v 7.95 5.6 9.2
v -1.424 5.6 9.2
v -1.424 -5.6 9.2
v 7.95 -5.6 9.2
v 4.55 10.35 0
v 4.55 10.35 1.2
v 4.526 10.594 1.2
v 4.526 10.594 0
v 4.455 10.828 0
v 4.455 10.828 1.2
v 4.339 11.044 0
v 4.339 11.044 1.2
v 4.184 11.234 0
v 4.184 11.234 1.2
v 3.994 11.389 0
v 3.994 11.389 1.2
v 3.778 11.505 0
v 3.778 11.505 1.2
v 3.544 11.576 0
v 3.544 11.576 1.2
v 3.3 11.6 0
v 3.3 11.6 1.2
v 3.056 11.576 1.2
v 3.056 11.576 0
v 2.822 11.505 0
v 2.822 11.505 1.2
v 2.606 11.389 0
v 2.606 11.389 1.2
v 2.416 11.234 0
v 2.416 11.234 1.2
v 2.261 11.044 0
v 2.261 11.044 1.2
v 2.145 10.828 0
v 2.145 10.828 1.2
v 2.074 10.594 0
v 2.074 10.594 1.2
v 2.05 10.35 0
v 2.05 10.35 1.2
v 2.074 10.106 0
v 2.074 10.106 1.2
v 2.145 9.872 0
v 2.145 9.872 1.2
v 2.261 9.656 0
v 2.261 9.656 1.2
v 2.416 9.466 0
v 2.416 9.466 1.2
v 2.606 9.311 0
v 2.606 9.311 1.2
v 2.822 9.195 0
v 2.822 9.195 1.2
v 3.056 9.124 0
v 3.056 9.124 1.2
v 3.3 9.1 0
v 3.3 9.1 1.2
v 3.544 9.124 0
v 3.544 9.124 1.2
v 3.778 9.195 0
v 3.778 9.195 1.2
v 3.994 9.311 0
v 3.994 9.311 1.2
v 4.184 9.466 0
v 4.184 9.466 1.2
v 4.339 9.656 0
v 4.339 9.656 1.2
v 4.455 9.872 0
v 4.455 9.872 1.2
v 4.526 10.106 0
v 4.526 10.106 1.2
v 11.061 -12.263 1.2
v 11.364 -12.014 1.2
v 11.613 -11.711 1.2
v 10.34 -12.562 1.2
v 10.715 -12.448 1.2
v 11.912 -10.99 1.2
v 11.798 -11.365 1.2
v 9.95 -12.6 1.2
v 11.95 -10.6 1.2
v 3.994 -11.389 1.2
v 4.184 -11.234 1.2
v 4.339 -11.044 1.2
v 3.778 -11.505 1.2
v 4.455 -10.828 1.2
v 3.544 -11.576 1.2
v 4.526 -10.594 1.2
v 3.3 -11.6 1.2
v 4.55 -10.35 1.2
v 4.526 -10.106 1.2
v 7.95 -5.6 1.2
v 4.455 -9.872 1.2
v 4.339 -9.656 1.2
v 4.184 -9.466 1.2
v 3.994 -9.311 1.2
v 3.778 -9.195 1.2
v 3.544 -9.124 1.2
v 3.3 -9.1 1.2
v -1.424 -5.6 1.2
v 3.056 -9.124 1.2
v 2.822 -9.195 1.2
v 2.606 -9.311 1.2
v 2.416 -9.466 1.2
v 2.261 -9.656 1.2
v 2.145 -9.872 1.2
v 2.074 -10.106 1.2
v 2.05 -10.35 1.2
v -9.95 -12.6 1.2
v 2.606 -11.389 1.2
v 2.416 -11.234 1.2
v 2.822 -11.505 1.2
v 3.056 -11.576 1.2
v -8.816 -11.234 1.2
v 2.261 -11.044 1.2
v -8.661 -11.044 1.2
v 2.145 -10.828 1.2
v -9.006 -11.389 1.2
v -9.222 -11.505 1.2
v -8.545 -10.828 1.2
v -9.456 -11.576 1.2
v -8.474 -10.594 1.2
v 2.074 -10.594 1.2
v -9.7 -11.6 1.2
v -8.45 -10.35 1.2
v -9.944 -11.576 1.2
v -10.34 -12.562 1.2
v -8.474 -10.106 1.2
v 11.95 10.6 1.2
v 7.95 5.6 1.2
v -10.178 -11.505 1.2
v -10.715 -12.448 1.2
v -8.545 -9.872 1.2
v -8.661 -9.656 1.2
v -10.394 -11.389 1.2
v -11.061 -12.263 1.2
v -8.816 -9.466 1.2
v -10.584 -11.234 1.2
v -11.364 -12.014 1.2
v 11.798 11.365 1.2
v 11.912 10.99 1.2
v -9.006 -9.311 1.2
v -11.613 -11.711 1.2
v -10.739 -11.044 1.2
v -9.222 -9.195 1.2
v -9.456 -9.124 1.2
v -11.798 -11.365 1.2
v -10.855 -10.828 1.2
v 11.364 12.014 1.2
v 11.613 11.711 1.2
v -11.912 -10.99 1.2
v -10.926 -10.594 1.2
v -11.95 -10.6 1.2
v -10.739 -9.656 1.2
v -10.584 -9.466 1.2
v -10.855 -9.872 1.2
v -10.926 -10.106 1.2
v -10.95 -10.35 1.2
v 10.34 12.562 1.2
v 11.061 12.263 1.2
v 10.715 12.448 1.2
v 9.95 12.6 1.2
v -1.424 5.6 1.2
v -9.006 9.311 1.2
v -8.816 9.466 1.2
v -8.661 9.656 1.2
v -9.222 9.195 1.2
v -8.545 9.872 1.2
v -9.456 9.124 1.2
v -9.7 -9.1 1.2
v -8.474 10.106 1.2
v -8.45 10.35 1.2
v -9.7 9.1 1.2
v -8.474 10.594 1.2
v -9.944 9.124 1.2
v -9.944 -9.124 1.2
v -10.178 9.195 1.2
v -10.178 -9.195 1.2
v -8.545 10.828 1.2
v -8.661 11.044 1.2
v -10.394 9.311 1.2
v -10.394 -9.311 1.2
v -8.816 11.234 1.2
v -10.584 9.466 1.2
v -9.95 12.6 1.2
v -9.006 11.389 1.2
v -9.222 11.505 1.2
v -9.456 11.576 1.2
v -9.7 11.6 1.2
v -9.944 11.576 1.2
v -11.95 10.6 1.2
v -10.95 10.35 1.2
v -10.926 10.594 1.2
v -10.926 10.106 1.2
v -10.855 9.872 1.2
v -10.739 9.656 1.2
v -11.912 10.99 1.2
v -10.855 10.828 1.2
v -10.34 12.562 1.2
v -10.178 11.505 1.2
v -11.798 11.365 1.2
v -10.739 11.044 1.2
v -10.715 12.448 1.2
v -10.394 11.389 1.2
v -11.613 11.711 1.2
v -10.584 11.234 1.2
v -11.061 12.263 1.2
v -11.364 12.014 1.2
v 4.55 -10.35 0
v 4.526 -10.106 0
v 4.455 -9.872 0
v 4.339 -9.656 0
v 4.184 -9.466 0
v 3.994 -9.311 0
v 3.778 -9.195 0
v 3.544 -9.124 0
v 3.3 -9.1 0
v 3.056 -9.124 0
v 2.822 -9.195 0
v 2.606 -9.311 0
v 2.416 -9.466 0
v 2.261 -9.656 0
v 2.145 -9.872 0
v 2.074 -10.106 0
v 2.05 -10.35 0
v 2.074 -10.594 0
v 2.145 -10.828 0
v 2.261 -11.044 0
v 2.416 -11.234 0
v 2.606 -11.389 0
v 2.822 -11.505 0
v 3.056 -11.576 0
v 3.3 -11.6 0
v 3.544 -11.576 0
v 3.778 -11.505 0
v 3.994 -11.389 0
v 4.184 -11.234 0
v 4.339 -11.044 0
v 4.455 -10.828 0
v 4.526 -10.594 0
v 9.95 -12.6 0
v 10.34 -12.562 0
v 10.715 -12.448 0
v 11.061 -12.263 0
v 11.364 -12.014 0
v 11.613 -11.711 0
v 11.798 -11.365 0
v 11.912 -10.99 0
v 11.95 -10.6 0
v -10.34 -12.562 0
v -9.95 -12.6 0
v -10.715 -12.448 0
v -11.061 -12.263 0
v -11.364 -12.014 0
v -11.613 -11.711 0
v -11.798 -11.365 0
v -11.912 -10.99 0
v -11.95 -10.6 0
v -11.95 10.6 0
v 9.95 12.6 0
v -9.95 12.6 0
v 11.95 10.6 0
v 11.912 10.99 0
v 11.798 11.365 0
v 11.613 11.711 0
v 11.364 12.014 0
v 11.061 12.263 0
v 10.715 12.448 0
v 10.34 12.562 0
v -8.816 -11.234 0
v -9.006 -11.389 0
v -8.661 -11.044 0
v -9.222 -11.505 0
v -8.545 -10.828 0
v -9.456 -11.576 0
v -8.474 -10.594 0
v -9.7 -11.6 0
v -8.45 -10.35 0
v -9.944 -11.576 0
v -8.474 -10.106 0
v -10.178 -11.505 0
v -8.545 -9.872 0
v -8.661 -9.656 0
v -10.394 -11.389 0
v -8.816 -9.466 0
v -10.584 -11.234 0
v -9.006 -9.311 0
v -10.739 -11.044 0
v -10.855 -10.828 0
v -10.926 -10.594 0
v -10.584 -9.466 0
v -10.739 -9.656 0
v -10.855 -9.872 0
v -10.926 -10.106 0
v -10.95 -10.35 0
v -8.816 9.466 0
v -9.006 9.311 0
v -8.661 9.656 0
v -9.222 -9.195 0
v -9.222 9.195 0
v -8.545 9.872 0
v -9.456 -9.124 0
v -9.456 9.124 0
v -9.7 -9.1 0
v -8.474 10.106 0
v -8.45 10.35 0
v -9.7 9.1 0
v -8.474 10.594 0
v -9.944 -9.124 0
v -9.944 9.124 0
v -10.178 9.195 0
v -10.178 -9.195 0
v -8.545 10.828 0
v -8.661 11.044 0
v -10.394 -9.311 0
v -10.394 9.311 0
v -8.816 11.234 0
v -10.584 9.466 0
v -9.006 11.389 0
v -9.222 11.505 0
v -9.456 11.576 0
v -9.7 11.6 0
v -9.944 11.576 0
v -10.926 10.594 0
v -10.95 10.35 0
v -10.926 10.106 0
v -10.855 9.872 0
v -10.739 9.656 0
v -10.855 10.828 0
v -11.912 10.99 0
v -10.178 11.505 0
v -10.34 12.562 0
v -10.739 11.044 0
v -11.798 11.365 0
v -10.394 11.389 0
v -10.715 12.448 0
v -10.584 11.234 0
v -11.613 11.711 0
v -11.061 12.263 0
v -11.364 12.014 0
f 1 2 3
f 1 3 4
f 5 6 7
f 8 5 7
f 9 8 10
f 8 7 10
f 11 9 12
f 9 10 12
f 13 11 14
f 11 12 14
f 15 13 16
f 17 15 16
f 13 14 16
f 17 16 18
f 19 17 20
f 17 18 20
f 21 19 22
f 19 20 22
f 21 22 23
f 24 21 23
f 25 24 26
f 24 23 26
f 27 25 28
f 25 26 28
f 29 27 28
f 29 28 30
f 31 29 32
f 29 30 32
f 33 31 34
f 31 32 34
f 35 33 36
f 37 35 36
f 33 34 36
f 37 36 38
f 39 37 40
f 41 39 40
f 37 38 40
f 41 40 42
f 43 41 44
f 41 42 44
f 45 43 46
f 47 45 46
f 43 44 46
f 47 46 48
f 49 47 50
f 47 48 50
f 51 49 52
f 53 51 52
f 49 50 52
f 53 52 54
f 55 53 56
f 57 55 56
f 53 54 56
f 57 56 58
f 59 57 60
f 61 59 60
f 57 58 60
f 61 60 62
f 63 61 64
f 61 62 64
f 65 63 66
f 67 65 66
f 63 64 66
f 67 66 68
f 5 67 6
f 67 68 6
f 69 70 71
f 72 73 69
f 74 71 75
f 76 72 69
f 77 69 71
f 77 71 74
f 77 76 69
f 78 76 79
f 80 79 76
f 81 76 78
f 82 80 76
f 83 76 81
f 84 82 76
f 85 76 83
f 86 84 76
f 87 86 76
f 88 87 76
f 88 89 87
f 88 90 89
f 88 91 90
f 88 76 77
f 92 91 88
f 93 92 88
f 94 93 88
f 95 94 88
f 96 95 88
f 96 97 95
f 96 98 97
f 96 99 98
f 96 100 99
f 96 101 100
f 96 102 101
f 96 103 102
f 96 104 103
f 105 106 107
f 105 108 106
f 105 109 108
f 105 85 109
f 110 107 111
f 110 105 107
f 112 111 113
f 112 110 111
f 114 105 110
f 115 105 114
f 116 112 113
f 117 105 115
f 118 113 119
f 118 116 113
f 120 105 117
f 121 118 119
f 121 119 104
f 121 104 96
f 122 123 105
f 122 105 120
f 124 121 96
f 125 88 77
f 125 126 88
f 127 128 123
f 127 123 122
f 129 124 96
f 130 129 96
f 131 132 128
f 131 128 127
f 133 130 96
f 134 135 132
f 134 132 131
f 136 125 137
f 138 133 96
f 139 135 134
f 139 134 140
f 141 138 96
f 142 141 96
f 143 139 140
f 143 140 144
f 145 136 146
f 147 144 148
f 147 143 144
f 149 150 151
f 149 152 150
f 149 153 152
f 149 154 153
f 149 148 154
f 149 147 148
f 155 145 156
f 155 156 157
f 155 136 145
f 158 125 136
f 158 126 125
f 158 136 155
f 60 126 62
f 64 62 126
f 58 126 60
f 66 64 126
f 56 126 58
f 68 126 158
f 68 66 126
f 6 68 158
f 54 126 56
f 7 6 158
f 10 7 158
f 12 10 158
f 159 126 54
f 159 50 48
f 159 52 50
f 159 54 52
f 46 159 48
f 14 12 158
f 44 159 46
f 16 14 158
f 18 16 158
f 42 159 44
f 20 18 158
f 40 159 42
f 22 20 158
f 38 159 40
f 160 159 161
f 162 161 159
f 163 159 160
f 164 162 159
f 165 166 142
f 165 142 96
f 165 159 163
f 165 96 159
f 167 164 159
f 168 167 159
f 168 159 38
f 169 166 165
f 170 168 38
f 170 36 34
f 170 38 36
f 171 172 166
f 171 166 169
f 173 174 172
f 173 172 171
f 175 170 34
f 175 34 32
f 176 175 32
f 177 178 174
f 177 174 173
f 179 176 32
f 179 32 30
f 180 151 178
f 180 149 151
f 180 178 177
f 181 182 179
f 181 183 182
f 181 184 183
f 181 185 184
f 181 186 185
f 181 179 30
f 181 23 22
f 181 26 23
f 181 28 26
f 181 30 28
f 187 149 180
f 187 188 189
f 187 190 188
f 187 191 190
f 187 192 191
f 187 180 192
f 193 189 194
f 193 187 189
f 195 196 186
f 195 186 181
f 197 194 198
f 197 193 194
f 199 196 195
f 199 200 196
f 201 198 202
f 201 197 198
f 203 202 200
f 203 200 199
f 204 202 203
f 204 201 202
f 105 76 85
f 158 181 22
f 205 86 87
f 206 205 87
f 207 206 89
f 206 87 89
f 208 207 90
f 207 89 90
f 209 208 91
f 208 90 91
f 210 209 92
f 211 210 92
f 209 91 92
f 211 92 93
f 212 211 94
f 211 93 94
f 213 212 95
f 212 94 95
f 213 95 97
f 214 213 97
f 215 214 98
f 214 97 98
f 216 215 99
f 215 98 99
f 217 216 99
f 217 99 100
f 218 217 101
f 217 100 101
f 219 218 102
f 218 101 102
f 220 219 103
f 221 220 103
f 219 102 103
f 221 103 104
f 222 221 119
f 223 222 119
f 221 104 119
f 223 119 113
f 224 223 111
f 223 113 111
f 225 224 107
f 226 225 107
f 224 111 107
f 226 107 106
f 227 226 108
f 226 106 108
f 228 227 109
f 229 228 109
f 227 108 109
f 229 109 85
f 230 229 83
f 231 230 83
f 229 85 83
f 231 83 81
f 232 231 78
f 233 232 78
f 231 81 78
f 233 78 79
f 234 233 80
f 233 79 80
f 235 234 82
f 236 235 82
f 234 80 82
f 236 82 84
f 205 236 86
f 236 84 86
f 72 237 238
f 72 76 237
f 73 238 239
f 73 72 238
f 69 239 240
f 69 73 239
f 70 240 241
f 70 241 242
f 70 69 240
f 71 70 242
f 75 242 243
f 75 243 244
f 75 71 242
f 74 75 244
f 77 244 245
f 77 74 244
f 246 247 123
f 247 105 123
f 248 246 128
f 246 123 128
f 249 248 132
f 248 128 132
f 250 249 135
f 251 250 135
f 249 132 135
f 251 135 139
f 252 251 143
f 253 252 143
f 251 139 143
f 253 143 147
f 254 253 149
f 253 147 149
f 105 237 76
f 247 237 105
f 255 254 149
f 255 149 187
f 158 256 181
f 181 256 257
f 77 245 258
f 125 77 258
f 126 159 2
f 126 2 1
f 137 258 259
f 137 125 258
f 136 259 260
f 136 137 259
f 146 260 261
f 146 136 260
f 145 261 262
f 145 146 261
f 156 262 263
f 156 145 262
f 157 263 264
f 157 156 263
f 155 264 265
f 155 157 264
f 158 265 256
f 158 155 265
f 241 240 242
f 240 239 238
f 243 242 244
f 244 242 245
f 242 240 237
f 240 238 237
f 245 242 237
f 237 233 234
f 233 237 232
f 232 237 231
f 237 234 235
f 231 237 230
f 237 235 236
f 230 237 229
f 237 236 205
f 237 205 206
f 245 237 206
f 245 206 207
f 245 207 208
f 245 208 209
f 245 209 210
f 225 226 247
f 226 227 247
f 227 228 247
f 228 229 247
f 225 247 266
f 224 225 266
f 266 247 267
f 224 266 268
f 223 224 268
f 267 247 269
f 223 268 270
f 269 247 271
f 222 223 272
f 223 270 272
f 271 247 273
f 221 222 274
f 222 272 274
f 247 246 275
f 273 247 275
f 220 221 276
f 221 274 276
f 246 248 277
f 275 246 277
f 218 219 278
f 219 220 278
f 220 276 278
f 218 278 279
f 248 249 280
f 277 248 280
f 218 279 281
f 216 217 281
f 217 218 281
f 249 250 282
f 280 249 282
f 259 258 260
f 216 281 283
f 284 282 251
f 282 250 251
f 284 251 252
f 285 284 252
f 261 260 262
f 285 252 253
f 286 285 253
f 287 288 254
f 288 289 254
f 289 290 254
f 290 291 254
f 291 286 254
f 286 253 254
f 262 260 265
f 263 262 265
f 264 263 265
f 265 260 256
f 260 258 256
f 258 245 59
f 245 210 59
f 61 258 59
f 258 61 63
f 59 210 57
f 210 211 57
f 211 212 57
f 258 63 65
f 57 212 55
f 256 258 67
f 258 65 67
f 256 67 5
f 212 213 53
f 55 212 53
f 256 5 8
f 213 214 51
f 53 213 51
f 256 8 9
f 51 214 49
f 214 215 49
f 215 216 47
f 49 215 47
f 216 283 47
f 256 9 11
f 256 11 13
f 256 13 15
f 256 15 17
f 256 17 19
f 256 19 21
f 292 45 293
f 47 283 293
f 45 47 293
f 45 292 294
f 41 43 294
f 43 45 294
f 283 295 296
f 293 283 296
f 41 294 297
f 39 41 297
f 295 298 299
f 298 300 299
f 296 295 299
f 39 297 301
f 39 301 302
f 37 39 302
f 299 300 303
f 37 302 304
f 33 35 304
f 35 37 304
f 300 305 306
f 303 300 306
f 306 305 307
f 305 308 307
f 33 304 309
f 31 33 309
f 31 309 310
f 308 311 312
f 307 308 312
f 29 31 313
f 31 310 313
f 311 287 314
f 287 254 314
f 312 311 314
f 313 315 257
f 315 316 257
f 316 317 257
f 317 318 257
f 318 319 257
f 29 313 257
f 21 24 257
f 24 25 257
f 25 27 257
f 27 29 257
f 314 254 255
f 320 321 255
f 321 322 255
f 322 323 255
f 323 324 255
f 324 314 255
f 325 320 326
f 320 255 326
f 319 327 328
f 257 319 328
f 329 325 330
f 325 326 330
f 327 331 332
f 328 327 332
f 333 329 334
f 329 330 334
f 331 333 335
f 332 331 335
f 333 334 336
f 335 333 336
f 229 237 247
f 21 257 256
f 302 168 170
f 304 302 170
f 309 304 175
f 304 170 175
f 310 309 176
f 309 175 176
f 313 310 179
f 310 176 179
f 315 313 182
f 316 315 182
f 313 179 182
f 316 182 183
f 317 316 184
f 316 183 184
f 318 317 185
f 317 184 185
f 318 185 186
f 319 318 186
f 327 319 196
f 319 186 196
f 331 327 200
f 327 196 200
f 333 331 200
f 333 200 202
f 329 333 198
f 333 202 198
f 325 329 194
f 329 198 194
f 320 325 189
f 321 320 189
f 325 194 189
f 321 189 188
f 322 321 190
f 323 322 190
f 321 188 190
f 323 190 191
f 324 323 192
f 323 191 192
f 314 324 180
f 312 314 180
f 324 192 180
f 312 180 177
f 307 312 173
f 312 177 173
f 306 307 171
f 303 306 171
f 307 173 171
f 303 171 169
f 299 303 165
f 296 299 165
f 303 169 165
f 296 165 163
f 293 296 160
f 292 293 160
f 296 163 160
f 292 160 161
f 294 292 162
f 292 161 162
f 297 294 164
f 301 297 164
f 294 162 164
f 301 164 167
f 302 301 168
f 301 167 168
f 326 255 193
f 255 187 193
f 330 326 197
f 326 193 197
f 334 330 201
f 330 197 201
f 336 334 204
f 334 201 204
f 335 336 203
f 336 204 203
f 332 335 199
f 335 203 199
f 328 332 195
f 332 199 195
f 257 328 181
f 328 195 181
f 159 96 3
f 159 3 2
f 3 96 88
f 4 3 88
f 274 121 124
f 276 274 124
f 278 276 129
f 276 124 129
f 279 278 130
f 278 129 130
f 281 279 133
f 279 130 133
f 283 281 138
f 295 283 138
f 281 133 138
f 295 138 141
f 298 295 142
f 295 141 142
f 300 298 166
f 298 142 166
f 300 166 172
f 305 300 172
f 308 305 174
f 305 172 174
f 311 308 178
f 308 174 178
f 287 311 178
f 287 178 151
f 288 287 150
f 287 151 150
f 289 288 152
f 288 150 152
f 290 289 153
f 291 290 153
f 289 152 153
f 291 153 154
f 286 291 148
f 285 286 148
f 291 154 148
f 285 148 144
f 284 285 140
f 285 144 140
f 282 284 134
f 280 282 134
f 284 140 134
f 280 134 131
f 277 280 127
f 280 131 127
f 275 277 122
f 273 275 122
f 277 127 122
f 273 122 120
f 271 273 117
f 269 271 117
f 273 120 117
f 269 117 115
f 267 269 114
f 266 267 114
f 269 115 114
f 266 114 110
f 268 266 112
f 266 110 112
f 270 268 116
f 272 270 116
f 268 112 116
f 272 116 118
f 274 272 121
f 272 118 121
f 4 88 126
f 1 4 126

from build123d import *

# Parameters (mm, degrees)
CROQUIS1_W              = 25.2
CROQUIS1_H              = 23.9
SALIENTE_EXTRUIR1_DEPTH = 1.2
CROQUIS2_R              = 1.25
CORTAR_EXTRUIR1_DEPTH   = 1.2
REDONDEO1_R             = 2
CROQUIS3_W              = 9.37393079
CROQUIS3_H              = 11.2
SALIENTE_EXTRUIR2_DEPTH = 8


with BuildPart() as part:
    # Croquis1 → Saliente-Extruir1 (new body)
    with BuildSketch(Plane(origin=(0, 0, 0), x_dir=(0, 1, 0), z_dir=(0, 0, 1))):
        Rectangle(CROQUIS1_W, CROQUIS1_H)
    extrude(amount=SALIENTE_EXTRUIR1_DEPTH)

    # Croquis2 → Cortar-Extruir1 (cut)
    with BuildSketch(Plane.XY.offset(1.2)):
        with Locations((-9.7, -10.35)):
            Circle(CROQUIS2_R)
        with Locations((3.3, -10.35)):
            Circle(CROQUIS2_R)
        with Locations((3.3, 10.35)):
            Circle(CROQUIS2_R)
        with Locations((-9.7, 10.35)):
            Circle(CROQUIS2_R)
    extrude(amount=-CORTAR_EXTRUIR1_DEPTH, mode=Mode.SUBTRACT)

    # Redondeo1
    redondeo1_edges = [part.edges().sort_by_distance(p)[0] for p in [
        (11.95, 12.6, 0.6),
        (11.95, -12.6, 0.6),
        (-11.95, -12.6, 0.6),
        (-11.95, 12.6, 0.6),
    ]]
    fillet(redondeo1_edges, radius=REDONDEO1_R)

    # Croquis3 → Saliente-Extruir2 (add)
    with BuildSketch(Plane.XY.offset(1.2)):
        with Locations((3.263034605, 0)):
            Rectangle(CROQUIS3_W, CROQUIS3_H)
    extrude(amount=SALIENTE_EXTRUIR2_DEPTH)


solid = part.part
